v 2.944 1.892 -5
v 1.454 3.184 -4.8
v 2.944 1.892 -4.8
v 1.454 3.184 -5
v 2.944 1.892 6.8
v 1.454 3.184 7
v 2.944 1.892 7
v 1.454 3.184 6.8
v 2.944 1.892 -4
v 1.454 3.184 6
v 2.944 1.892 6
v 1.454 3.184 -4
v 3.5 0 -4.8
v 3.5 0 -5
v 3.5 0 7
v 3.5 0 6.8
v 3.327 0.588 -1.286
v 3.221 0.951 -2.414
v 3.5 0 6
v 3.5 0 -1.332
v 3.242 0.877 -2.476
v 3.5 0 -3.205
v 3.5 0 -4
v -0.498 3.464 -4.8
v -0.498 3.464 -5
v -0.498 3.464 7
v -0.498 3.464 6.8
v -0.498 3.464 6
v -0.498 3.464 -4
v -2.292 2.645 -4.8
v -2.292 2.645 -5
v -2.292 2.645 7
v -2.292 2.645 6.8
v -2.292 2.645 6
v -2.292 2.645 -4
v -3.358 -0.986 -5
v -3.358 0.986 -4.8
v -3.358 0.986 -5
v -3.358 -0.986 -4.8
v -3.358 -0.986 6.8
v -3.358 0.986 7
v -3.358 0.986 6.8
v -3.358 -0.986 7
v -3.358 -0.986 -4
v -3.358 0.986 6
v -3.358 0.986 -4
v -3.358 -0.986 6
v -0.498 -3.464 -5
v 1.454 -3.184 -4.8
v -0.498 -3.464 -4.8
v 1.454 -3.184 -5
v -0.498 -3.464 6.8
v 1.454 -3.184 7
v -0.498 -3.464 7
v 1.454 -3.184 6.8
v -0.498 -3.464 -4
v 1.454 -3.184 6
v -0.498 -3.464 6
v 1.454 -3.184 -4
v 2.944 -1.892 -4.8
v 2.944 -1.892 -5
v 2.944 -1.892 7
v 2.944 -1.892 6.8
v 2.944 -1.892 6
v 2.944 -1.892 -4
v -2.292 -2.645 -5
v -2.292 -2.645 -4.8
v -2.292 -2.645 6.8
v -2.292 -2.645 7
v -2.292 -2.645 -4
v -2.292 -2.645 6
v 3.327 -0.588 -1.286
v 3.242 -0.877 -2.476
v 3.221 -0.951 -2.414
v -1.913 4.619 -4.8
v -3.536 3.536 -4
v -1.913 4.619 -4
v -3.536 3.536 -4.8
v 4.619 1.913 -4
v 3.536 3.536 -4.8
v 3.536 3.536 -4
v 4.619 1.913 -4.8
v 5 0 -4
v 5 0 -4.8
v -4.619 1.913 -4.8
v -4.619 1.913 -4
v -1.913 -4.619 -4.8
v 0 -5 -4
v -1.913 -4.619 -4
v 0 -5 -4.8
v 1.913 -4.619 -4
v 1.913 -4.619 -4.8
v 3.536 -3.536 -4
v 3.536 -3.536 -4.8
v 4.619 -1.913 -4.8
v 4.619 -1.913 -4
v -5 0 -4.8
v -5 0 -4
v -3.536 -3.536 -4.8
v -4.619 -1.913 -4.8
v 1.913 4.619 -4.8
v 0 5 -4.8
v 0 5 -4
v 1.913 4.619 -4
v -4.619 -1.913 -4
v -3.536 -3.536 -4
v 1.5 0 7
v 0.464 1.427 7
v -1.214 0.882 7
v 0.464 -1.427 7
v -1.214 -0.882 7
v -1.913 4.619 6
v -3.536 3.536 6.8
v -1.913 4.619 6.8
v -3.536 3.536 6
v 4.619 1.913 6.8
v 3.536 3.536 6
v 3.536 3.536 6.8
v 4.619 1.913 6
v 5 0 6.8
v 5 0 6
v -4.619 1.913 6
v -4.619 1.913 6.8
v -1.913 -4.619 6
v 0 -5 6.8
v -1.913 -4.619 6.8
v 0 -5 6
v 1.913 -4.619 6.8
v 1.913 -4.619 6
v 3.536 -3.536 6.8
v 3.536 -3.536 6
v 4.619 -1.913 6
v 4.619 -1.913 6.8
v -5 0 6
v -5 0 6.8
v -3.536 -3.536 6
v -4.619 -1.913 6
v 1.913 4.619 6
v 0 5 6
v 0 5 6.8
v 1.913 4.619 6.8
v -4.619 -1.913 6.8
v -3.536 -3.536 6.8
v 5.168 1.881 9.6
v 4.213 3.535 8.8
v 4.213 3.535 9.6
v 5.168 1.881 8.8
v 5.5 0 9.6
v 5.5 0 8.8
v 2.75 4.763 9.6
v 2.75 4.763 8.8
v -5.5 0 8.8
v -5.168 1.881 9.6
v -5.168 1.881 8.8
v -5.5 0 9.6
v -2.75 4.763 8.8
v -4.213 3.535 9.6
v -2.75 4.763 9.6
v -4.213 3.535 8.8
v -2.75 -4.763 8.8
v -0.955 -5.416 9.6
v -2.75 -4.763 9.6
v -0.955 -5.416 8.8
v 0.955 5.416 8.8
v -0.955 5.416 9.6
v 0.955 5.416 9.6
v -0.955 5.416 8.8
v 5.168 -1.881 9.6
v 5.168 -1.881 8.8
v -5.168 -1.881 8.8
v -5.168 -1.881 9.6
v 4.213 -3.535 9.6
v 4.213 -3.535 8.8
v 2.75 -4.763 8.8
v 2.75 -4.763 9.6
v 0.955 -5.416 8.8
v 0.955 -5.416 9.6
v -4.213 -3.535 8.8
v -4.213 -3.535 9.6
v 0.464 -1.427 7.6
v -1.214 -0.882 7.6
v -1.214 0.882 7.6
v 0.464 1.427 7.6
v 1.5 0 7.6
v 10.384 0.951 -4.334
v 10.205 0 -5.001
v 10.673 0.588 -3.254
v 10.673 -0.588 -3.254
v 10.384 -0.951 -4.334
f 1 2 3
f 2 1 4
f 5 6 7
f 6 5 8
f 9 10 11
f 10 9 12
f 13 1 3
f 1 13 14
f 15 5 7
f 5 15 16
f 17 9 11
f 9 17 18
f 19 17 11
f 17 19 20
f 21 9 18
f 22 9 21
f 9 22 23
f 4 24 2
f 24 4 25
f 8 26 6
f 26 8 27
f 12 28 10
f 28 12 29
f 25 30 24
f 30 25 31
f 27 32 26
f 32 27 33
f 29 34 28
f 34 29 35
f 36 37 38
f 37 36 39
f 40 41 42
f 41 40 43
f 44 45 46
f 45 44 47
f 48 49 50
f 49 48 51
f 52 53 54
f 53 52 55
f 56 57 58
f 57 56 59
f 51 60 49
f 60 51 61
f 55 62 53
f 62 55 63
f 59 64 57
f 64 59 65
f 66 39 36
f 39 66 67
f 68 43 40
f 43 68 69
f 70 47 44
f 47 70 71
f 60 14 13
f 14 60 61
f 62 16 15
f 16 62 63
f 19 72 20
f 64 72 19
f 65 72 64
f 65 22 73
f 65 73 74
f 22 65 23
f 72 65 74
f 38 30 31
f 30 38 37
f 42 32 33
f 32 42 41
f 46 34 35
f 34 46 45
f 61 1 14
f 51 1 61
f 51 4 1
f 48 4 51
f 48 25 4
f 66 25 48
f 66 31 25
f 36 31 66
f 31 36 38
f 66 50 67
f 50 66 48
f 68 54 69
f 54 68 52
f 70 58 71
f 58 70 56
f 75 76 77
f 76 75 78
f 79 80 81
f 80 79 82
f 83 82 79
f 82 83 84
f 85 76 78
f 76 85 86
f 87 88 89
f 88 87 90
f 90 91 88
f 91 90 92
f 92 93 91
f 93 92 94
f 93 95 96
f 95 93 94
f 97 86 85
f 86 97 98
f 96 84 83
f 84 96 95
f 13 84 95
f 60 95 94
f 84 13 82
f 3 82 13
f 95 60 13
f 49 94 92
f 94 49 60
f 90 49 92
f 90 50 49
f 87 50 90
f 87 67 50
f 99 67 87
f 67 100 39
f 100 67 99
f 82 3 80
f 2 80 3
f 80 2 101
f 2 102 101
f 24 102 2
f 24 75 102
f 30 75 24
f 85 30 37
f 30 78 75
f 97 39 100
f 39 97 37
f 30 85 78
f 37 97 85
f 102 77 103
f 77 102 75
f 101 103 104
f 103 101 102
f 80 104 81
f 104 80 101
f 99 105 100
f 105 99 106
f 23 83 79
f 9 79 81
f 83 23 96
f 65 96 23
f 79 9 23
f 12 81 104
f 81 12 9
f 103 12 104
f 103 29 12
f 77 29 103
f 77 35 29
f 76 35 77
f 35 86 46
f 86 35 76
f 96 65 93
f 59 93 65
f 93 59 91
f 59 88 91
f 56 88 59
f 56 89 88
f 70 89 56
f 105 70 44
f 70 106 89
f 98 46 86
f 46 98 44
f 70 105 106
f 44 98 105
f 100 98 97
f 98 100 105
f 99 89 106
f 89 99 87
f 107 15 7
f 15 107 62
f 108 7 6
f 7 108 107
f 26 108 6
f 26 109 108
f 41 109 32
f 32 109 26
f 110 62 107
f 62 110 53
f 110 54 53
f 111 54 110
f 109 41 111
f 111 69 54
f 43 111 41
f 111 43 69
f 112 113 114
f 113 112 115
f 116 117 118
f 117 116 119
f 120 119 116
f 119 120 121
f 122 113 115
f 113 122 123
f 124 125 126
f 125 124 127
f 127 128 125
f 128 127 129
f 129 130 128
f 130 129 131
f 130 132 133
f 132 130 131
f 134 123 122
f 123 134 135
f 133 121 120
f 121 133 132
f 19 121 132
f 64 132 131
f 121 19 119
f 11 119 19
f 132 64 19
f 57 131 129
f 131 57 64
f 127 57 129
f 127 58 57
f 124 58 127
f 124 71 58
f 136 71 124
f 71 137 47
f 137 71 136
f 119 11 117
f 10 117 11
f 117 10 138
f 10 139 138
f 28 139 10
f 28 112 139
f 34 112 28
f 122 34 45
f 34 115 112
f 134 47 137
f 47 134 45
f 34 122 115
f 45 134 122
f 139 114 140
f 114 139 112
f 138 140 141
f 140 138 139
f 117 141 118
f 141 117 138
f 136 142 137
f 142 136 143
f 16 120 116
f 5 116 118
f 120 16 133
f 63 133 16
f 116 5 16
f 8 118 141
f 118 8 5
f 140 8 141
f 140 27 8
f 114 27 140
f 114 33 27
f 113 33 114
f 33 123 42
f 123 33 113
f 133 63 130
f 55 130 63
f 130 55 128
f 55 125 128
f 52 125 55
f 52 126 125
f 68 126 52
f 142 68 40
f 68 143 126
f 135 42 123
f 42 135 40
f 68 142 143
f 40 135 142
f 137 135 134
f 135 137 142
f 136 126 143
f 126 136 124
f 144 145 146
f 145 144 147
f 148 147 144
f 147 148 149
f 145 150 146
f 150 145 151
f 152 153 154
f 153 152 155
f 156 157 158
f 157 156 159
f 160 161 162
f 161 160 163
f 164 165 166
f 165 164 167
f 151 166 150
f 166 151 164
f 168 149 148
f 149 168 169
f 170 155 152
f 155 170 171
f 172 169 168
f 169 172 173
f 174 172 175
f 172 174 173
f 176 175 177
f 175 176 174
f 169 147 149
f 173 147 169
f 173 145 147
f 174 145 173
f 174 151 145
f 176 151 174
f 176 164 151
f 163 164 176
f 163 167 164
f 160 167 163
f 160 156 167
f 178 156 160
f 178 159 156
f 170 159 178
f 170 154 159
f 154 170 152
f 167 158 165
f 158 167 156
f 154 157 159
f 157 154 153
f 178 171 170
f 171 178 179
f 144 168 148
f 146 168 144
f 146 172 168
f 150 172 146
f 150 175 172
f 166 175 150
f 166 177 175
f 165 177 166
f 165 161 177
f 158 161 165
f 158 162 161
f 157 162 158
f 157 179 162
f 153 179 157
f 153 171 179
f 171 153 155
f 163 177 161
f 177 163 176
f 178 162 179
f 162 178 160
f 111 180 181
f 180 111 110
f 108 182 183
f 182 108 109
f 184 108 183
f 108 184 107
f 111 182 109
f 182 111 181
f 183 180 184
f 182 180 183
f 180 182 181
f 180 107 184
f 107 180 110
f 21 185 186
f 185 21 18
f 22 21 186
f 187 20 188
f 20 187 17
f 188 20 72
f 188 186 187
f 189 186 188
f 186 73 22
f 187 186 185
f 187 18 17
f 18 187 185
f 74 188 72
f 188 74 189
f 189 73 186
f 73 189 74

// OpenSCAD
// Parameters
body_diameter_mm = 7; //[3.5:14:0.1]
overall_height_mm = 13.6; //[6.8:27.2:0.1]
body_height_mm = 10; //[5:20:0.1]
actuator_height_mm = 3.6; //[1.8:7.2:0.1]
actuator_diameter_mm = 3; //[1.5:6:0.1]
lever_length_mm = 8; //[4:16:0.1]
lever_diameter_mm = 2; //[1:4:0.1]
bushing_diameter_mm = 7; //[3.5:14:0.1]
bushing_height_mm = 3; //[1.5:6:0.1]
panel_thickness_mm = 3; //[1.5:6:0.1]
seat_overhang_mm = 1.5; //[0.75:3:0.1]
seat_thickness_mm = 0.8; //[0.4:1.6:0.1]
nut_seat_diameter_mm = 11; //[5.5:22:0.1]
overlap_mm = 1; //[0.5:2:0.1]
lever_tilt_deg = 15; //[0:30:1]

// Toggle switch - complete geometry (all parts physically connected)
module toggle() {
  color("DimGray")
  union() {

    // Main cylindrical body (centered at Z=0)
    cylinder(r=body_diameter_mm/2, h=body_height_mm, center=true);

    // --- FIX: Bottom circular plate/flange must intersect the body (no gap) ---
    // Place so its TOP face is inside the body by overlap_mm.
    // Body bottom face: z = -body_height_mm/2
    // Plate center z = body_bottom - plate_h/2 + overlap
    translate([0, 0, -body_height_mm/2 - seat_thickness_mm/2 + overlap_mm])
      cylinder(r=(bushing_diameter_mm/2) + seat_overhang_mm, h=seat_thickness_mm, center=true);

    // Threaded bushing/collar (attached to top of body with overlap)
    // Body top face: z = +body_height_mm/2
    // Bushing center z = body_top + bushing_h/2 - overlap
    translate([0, 0, body_height_mm/2 + bushing_height_mm/2 - overlap_mm])
      cylinder(r=bushing_diameter_mm/2, h=bushing_height_mm, center=true);

    // Panel mount washer seat (top circular cap/washer) attached to TOP of bushing with overlap
    // Bushing top face (with overlap already): z = body_top + bushing_h - overlap
    // Washer center z = bushing_top + washer_h/2 - overlap
    translate([0, 0, body_height_mm/2 + bushing_height_mm + seat_thickness_mm/2 - 2*overlap_mm])
      cylinder(r=(bushing_diameter_mm/2) + seat_overhang_mm, h=seat_thickness_mm, center=true);

    // Panel mount nut seat (kept above washer seat, but overlapping it to ensure connection)
    // Washer top face: z = body_top + bushing_h + seat_thickness - 2*overlap
    // Nut seat center z = washer_top + panel_thickness + nut_h/2 - overlap
    translate([0, 0,
      (body_height_mm/2 + bushing_height_mm + seat_thickness_mm - 2*overlap_mm)
      + panel_thickness_mm
      + seat_thickness_mm/2
      - overlap_mm
    ])
      cylinder(r=nut_seat_diameter_mm/2, h=seat_thickness_mm, center=true);

    // Top actuator cylinder (attached to top of body with overlap)
    // Actuator center z = body_top + actuator_h/2 - overlap
    translate([0, 0, body_height_mm/2 + actuator_height_mm/2 - overlap_mm])
      cylinder(r=actuator_diameter_mm/2, h=actuator_height_mm, center=true);

    // Toggle pivot ball (overlaps actuator/body region)
    translate([0, 0, body_height_mm/2 + overlap_mm])
      sphere(r=actuator_diameter_mm/2);

    // Lever (kept intersecting the pivot ball/actuator region)
    rotate([0, 90, 0])
      translate([lever_length_mm/2 - overlap_mm, 0,
        body_height_mm/2 + actuator_height_mm - lever_diameter_mm/2 - overlap_mm
      ])
      rotate([0, lever_tilt_deg, 0])
      cylinder(r=lever_diameter_mm/2, h=lever_length_mm, center=true);
  }
}

// Assembly
module assembly() {
  toggle();
}

assembly();
